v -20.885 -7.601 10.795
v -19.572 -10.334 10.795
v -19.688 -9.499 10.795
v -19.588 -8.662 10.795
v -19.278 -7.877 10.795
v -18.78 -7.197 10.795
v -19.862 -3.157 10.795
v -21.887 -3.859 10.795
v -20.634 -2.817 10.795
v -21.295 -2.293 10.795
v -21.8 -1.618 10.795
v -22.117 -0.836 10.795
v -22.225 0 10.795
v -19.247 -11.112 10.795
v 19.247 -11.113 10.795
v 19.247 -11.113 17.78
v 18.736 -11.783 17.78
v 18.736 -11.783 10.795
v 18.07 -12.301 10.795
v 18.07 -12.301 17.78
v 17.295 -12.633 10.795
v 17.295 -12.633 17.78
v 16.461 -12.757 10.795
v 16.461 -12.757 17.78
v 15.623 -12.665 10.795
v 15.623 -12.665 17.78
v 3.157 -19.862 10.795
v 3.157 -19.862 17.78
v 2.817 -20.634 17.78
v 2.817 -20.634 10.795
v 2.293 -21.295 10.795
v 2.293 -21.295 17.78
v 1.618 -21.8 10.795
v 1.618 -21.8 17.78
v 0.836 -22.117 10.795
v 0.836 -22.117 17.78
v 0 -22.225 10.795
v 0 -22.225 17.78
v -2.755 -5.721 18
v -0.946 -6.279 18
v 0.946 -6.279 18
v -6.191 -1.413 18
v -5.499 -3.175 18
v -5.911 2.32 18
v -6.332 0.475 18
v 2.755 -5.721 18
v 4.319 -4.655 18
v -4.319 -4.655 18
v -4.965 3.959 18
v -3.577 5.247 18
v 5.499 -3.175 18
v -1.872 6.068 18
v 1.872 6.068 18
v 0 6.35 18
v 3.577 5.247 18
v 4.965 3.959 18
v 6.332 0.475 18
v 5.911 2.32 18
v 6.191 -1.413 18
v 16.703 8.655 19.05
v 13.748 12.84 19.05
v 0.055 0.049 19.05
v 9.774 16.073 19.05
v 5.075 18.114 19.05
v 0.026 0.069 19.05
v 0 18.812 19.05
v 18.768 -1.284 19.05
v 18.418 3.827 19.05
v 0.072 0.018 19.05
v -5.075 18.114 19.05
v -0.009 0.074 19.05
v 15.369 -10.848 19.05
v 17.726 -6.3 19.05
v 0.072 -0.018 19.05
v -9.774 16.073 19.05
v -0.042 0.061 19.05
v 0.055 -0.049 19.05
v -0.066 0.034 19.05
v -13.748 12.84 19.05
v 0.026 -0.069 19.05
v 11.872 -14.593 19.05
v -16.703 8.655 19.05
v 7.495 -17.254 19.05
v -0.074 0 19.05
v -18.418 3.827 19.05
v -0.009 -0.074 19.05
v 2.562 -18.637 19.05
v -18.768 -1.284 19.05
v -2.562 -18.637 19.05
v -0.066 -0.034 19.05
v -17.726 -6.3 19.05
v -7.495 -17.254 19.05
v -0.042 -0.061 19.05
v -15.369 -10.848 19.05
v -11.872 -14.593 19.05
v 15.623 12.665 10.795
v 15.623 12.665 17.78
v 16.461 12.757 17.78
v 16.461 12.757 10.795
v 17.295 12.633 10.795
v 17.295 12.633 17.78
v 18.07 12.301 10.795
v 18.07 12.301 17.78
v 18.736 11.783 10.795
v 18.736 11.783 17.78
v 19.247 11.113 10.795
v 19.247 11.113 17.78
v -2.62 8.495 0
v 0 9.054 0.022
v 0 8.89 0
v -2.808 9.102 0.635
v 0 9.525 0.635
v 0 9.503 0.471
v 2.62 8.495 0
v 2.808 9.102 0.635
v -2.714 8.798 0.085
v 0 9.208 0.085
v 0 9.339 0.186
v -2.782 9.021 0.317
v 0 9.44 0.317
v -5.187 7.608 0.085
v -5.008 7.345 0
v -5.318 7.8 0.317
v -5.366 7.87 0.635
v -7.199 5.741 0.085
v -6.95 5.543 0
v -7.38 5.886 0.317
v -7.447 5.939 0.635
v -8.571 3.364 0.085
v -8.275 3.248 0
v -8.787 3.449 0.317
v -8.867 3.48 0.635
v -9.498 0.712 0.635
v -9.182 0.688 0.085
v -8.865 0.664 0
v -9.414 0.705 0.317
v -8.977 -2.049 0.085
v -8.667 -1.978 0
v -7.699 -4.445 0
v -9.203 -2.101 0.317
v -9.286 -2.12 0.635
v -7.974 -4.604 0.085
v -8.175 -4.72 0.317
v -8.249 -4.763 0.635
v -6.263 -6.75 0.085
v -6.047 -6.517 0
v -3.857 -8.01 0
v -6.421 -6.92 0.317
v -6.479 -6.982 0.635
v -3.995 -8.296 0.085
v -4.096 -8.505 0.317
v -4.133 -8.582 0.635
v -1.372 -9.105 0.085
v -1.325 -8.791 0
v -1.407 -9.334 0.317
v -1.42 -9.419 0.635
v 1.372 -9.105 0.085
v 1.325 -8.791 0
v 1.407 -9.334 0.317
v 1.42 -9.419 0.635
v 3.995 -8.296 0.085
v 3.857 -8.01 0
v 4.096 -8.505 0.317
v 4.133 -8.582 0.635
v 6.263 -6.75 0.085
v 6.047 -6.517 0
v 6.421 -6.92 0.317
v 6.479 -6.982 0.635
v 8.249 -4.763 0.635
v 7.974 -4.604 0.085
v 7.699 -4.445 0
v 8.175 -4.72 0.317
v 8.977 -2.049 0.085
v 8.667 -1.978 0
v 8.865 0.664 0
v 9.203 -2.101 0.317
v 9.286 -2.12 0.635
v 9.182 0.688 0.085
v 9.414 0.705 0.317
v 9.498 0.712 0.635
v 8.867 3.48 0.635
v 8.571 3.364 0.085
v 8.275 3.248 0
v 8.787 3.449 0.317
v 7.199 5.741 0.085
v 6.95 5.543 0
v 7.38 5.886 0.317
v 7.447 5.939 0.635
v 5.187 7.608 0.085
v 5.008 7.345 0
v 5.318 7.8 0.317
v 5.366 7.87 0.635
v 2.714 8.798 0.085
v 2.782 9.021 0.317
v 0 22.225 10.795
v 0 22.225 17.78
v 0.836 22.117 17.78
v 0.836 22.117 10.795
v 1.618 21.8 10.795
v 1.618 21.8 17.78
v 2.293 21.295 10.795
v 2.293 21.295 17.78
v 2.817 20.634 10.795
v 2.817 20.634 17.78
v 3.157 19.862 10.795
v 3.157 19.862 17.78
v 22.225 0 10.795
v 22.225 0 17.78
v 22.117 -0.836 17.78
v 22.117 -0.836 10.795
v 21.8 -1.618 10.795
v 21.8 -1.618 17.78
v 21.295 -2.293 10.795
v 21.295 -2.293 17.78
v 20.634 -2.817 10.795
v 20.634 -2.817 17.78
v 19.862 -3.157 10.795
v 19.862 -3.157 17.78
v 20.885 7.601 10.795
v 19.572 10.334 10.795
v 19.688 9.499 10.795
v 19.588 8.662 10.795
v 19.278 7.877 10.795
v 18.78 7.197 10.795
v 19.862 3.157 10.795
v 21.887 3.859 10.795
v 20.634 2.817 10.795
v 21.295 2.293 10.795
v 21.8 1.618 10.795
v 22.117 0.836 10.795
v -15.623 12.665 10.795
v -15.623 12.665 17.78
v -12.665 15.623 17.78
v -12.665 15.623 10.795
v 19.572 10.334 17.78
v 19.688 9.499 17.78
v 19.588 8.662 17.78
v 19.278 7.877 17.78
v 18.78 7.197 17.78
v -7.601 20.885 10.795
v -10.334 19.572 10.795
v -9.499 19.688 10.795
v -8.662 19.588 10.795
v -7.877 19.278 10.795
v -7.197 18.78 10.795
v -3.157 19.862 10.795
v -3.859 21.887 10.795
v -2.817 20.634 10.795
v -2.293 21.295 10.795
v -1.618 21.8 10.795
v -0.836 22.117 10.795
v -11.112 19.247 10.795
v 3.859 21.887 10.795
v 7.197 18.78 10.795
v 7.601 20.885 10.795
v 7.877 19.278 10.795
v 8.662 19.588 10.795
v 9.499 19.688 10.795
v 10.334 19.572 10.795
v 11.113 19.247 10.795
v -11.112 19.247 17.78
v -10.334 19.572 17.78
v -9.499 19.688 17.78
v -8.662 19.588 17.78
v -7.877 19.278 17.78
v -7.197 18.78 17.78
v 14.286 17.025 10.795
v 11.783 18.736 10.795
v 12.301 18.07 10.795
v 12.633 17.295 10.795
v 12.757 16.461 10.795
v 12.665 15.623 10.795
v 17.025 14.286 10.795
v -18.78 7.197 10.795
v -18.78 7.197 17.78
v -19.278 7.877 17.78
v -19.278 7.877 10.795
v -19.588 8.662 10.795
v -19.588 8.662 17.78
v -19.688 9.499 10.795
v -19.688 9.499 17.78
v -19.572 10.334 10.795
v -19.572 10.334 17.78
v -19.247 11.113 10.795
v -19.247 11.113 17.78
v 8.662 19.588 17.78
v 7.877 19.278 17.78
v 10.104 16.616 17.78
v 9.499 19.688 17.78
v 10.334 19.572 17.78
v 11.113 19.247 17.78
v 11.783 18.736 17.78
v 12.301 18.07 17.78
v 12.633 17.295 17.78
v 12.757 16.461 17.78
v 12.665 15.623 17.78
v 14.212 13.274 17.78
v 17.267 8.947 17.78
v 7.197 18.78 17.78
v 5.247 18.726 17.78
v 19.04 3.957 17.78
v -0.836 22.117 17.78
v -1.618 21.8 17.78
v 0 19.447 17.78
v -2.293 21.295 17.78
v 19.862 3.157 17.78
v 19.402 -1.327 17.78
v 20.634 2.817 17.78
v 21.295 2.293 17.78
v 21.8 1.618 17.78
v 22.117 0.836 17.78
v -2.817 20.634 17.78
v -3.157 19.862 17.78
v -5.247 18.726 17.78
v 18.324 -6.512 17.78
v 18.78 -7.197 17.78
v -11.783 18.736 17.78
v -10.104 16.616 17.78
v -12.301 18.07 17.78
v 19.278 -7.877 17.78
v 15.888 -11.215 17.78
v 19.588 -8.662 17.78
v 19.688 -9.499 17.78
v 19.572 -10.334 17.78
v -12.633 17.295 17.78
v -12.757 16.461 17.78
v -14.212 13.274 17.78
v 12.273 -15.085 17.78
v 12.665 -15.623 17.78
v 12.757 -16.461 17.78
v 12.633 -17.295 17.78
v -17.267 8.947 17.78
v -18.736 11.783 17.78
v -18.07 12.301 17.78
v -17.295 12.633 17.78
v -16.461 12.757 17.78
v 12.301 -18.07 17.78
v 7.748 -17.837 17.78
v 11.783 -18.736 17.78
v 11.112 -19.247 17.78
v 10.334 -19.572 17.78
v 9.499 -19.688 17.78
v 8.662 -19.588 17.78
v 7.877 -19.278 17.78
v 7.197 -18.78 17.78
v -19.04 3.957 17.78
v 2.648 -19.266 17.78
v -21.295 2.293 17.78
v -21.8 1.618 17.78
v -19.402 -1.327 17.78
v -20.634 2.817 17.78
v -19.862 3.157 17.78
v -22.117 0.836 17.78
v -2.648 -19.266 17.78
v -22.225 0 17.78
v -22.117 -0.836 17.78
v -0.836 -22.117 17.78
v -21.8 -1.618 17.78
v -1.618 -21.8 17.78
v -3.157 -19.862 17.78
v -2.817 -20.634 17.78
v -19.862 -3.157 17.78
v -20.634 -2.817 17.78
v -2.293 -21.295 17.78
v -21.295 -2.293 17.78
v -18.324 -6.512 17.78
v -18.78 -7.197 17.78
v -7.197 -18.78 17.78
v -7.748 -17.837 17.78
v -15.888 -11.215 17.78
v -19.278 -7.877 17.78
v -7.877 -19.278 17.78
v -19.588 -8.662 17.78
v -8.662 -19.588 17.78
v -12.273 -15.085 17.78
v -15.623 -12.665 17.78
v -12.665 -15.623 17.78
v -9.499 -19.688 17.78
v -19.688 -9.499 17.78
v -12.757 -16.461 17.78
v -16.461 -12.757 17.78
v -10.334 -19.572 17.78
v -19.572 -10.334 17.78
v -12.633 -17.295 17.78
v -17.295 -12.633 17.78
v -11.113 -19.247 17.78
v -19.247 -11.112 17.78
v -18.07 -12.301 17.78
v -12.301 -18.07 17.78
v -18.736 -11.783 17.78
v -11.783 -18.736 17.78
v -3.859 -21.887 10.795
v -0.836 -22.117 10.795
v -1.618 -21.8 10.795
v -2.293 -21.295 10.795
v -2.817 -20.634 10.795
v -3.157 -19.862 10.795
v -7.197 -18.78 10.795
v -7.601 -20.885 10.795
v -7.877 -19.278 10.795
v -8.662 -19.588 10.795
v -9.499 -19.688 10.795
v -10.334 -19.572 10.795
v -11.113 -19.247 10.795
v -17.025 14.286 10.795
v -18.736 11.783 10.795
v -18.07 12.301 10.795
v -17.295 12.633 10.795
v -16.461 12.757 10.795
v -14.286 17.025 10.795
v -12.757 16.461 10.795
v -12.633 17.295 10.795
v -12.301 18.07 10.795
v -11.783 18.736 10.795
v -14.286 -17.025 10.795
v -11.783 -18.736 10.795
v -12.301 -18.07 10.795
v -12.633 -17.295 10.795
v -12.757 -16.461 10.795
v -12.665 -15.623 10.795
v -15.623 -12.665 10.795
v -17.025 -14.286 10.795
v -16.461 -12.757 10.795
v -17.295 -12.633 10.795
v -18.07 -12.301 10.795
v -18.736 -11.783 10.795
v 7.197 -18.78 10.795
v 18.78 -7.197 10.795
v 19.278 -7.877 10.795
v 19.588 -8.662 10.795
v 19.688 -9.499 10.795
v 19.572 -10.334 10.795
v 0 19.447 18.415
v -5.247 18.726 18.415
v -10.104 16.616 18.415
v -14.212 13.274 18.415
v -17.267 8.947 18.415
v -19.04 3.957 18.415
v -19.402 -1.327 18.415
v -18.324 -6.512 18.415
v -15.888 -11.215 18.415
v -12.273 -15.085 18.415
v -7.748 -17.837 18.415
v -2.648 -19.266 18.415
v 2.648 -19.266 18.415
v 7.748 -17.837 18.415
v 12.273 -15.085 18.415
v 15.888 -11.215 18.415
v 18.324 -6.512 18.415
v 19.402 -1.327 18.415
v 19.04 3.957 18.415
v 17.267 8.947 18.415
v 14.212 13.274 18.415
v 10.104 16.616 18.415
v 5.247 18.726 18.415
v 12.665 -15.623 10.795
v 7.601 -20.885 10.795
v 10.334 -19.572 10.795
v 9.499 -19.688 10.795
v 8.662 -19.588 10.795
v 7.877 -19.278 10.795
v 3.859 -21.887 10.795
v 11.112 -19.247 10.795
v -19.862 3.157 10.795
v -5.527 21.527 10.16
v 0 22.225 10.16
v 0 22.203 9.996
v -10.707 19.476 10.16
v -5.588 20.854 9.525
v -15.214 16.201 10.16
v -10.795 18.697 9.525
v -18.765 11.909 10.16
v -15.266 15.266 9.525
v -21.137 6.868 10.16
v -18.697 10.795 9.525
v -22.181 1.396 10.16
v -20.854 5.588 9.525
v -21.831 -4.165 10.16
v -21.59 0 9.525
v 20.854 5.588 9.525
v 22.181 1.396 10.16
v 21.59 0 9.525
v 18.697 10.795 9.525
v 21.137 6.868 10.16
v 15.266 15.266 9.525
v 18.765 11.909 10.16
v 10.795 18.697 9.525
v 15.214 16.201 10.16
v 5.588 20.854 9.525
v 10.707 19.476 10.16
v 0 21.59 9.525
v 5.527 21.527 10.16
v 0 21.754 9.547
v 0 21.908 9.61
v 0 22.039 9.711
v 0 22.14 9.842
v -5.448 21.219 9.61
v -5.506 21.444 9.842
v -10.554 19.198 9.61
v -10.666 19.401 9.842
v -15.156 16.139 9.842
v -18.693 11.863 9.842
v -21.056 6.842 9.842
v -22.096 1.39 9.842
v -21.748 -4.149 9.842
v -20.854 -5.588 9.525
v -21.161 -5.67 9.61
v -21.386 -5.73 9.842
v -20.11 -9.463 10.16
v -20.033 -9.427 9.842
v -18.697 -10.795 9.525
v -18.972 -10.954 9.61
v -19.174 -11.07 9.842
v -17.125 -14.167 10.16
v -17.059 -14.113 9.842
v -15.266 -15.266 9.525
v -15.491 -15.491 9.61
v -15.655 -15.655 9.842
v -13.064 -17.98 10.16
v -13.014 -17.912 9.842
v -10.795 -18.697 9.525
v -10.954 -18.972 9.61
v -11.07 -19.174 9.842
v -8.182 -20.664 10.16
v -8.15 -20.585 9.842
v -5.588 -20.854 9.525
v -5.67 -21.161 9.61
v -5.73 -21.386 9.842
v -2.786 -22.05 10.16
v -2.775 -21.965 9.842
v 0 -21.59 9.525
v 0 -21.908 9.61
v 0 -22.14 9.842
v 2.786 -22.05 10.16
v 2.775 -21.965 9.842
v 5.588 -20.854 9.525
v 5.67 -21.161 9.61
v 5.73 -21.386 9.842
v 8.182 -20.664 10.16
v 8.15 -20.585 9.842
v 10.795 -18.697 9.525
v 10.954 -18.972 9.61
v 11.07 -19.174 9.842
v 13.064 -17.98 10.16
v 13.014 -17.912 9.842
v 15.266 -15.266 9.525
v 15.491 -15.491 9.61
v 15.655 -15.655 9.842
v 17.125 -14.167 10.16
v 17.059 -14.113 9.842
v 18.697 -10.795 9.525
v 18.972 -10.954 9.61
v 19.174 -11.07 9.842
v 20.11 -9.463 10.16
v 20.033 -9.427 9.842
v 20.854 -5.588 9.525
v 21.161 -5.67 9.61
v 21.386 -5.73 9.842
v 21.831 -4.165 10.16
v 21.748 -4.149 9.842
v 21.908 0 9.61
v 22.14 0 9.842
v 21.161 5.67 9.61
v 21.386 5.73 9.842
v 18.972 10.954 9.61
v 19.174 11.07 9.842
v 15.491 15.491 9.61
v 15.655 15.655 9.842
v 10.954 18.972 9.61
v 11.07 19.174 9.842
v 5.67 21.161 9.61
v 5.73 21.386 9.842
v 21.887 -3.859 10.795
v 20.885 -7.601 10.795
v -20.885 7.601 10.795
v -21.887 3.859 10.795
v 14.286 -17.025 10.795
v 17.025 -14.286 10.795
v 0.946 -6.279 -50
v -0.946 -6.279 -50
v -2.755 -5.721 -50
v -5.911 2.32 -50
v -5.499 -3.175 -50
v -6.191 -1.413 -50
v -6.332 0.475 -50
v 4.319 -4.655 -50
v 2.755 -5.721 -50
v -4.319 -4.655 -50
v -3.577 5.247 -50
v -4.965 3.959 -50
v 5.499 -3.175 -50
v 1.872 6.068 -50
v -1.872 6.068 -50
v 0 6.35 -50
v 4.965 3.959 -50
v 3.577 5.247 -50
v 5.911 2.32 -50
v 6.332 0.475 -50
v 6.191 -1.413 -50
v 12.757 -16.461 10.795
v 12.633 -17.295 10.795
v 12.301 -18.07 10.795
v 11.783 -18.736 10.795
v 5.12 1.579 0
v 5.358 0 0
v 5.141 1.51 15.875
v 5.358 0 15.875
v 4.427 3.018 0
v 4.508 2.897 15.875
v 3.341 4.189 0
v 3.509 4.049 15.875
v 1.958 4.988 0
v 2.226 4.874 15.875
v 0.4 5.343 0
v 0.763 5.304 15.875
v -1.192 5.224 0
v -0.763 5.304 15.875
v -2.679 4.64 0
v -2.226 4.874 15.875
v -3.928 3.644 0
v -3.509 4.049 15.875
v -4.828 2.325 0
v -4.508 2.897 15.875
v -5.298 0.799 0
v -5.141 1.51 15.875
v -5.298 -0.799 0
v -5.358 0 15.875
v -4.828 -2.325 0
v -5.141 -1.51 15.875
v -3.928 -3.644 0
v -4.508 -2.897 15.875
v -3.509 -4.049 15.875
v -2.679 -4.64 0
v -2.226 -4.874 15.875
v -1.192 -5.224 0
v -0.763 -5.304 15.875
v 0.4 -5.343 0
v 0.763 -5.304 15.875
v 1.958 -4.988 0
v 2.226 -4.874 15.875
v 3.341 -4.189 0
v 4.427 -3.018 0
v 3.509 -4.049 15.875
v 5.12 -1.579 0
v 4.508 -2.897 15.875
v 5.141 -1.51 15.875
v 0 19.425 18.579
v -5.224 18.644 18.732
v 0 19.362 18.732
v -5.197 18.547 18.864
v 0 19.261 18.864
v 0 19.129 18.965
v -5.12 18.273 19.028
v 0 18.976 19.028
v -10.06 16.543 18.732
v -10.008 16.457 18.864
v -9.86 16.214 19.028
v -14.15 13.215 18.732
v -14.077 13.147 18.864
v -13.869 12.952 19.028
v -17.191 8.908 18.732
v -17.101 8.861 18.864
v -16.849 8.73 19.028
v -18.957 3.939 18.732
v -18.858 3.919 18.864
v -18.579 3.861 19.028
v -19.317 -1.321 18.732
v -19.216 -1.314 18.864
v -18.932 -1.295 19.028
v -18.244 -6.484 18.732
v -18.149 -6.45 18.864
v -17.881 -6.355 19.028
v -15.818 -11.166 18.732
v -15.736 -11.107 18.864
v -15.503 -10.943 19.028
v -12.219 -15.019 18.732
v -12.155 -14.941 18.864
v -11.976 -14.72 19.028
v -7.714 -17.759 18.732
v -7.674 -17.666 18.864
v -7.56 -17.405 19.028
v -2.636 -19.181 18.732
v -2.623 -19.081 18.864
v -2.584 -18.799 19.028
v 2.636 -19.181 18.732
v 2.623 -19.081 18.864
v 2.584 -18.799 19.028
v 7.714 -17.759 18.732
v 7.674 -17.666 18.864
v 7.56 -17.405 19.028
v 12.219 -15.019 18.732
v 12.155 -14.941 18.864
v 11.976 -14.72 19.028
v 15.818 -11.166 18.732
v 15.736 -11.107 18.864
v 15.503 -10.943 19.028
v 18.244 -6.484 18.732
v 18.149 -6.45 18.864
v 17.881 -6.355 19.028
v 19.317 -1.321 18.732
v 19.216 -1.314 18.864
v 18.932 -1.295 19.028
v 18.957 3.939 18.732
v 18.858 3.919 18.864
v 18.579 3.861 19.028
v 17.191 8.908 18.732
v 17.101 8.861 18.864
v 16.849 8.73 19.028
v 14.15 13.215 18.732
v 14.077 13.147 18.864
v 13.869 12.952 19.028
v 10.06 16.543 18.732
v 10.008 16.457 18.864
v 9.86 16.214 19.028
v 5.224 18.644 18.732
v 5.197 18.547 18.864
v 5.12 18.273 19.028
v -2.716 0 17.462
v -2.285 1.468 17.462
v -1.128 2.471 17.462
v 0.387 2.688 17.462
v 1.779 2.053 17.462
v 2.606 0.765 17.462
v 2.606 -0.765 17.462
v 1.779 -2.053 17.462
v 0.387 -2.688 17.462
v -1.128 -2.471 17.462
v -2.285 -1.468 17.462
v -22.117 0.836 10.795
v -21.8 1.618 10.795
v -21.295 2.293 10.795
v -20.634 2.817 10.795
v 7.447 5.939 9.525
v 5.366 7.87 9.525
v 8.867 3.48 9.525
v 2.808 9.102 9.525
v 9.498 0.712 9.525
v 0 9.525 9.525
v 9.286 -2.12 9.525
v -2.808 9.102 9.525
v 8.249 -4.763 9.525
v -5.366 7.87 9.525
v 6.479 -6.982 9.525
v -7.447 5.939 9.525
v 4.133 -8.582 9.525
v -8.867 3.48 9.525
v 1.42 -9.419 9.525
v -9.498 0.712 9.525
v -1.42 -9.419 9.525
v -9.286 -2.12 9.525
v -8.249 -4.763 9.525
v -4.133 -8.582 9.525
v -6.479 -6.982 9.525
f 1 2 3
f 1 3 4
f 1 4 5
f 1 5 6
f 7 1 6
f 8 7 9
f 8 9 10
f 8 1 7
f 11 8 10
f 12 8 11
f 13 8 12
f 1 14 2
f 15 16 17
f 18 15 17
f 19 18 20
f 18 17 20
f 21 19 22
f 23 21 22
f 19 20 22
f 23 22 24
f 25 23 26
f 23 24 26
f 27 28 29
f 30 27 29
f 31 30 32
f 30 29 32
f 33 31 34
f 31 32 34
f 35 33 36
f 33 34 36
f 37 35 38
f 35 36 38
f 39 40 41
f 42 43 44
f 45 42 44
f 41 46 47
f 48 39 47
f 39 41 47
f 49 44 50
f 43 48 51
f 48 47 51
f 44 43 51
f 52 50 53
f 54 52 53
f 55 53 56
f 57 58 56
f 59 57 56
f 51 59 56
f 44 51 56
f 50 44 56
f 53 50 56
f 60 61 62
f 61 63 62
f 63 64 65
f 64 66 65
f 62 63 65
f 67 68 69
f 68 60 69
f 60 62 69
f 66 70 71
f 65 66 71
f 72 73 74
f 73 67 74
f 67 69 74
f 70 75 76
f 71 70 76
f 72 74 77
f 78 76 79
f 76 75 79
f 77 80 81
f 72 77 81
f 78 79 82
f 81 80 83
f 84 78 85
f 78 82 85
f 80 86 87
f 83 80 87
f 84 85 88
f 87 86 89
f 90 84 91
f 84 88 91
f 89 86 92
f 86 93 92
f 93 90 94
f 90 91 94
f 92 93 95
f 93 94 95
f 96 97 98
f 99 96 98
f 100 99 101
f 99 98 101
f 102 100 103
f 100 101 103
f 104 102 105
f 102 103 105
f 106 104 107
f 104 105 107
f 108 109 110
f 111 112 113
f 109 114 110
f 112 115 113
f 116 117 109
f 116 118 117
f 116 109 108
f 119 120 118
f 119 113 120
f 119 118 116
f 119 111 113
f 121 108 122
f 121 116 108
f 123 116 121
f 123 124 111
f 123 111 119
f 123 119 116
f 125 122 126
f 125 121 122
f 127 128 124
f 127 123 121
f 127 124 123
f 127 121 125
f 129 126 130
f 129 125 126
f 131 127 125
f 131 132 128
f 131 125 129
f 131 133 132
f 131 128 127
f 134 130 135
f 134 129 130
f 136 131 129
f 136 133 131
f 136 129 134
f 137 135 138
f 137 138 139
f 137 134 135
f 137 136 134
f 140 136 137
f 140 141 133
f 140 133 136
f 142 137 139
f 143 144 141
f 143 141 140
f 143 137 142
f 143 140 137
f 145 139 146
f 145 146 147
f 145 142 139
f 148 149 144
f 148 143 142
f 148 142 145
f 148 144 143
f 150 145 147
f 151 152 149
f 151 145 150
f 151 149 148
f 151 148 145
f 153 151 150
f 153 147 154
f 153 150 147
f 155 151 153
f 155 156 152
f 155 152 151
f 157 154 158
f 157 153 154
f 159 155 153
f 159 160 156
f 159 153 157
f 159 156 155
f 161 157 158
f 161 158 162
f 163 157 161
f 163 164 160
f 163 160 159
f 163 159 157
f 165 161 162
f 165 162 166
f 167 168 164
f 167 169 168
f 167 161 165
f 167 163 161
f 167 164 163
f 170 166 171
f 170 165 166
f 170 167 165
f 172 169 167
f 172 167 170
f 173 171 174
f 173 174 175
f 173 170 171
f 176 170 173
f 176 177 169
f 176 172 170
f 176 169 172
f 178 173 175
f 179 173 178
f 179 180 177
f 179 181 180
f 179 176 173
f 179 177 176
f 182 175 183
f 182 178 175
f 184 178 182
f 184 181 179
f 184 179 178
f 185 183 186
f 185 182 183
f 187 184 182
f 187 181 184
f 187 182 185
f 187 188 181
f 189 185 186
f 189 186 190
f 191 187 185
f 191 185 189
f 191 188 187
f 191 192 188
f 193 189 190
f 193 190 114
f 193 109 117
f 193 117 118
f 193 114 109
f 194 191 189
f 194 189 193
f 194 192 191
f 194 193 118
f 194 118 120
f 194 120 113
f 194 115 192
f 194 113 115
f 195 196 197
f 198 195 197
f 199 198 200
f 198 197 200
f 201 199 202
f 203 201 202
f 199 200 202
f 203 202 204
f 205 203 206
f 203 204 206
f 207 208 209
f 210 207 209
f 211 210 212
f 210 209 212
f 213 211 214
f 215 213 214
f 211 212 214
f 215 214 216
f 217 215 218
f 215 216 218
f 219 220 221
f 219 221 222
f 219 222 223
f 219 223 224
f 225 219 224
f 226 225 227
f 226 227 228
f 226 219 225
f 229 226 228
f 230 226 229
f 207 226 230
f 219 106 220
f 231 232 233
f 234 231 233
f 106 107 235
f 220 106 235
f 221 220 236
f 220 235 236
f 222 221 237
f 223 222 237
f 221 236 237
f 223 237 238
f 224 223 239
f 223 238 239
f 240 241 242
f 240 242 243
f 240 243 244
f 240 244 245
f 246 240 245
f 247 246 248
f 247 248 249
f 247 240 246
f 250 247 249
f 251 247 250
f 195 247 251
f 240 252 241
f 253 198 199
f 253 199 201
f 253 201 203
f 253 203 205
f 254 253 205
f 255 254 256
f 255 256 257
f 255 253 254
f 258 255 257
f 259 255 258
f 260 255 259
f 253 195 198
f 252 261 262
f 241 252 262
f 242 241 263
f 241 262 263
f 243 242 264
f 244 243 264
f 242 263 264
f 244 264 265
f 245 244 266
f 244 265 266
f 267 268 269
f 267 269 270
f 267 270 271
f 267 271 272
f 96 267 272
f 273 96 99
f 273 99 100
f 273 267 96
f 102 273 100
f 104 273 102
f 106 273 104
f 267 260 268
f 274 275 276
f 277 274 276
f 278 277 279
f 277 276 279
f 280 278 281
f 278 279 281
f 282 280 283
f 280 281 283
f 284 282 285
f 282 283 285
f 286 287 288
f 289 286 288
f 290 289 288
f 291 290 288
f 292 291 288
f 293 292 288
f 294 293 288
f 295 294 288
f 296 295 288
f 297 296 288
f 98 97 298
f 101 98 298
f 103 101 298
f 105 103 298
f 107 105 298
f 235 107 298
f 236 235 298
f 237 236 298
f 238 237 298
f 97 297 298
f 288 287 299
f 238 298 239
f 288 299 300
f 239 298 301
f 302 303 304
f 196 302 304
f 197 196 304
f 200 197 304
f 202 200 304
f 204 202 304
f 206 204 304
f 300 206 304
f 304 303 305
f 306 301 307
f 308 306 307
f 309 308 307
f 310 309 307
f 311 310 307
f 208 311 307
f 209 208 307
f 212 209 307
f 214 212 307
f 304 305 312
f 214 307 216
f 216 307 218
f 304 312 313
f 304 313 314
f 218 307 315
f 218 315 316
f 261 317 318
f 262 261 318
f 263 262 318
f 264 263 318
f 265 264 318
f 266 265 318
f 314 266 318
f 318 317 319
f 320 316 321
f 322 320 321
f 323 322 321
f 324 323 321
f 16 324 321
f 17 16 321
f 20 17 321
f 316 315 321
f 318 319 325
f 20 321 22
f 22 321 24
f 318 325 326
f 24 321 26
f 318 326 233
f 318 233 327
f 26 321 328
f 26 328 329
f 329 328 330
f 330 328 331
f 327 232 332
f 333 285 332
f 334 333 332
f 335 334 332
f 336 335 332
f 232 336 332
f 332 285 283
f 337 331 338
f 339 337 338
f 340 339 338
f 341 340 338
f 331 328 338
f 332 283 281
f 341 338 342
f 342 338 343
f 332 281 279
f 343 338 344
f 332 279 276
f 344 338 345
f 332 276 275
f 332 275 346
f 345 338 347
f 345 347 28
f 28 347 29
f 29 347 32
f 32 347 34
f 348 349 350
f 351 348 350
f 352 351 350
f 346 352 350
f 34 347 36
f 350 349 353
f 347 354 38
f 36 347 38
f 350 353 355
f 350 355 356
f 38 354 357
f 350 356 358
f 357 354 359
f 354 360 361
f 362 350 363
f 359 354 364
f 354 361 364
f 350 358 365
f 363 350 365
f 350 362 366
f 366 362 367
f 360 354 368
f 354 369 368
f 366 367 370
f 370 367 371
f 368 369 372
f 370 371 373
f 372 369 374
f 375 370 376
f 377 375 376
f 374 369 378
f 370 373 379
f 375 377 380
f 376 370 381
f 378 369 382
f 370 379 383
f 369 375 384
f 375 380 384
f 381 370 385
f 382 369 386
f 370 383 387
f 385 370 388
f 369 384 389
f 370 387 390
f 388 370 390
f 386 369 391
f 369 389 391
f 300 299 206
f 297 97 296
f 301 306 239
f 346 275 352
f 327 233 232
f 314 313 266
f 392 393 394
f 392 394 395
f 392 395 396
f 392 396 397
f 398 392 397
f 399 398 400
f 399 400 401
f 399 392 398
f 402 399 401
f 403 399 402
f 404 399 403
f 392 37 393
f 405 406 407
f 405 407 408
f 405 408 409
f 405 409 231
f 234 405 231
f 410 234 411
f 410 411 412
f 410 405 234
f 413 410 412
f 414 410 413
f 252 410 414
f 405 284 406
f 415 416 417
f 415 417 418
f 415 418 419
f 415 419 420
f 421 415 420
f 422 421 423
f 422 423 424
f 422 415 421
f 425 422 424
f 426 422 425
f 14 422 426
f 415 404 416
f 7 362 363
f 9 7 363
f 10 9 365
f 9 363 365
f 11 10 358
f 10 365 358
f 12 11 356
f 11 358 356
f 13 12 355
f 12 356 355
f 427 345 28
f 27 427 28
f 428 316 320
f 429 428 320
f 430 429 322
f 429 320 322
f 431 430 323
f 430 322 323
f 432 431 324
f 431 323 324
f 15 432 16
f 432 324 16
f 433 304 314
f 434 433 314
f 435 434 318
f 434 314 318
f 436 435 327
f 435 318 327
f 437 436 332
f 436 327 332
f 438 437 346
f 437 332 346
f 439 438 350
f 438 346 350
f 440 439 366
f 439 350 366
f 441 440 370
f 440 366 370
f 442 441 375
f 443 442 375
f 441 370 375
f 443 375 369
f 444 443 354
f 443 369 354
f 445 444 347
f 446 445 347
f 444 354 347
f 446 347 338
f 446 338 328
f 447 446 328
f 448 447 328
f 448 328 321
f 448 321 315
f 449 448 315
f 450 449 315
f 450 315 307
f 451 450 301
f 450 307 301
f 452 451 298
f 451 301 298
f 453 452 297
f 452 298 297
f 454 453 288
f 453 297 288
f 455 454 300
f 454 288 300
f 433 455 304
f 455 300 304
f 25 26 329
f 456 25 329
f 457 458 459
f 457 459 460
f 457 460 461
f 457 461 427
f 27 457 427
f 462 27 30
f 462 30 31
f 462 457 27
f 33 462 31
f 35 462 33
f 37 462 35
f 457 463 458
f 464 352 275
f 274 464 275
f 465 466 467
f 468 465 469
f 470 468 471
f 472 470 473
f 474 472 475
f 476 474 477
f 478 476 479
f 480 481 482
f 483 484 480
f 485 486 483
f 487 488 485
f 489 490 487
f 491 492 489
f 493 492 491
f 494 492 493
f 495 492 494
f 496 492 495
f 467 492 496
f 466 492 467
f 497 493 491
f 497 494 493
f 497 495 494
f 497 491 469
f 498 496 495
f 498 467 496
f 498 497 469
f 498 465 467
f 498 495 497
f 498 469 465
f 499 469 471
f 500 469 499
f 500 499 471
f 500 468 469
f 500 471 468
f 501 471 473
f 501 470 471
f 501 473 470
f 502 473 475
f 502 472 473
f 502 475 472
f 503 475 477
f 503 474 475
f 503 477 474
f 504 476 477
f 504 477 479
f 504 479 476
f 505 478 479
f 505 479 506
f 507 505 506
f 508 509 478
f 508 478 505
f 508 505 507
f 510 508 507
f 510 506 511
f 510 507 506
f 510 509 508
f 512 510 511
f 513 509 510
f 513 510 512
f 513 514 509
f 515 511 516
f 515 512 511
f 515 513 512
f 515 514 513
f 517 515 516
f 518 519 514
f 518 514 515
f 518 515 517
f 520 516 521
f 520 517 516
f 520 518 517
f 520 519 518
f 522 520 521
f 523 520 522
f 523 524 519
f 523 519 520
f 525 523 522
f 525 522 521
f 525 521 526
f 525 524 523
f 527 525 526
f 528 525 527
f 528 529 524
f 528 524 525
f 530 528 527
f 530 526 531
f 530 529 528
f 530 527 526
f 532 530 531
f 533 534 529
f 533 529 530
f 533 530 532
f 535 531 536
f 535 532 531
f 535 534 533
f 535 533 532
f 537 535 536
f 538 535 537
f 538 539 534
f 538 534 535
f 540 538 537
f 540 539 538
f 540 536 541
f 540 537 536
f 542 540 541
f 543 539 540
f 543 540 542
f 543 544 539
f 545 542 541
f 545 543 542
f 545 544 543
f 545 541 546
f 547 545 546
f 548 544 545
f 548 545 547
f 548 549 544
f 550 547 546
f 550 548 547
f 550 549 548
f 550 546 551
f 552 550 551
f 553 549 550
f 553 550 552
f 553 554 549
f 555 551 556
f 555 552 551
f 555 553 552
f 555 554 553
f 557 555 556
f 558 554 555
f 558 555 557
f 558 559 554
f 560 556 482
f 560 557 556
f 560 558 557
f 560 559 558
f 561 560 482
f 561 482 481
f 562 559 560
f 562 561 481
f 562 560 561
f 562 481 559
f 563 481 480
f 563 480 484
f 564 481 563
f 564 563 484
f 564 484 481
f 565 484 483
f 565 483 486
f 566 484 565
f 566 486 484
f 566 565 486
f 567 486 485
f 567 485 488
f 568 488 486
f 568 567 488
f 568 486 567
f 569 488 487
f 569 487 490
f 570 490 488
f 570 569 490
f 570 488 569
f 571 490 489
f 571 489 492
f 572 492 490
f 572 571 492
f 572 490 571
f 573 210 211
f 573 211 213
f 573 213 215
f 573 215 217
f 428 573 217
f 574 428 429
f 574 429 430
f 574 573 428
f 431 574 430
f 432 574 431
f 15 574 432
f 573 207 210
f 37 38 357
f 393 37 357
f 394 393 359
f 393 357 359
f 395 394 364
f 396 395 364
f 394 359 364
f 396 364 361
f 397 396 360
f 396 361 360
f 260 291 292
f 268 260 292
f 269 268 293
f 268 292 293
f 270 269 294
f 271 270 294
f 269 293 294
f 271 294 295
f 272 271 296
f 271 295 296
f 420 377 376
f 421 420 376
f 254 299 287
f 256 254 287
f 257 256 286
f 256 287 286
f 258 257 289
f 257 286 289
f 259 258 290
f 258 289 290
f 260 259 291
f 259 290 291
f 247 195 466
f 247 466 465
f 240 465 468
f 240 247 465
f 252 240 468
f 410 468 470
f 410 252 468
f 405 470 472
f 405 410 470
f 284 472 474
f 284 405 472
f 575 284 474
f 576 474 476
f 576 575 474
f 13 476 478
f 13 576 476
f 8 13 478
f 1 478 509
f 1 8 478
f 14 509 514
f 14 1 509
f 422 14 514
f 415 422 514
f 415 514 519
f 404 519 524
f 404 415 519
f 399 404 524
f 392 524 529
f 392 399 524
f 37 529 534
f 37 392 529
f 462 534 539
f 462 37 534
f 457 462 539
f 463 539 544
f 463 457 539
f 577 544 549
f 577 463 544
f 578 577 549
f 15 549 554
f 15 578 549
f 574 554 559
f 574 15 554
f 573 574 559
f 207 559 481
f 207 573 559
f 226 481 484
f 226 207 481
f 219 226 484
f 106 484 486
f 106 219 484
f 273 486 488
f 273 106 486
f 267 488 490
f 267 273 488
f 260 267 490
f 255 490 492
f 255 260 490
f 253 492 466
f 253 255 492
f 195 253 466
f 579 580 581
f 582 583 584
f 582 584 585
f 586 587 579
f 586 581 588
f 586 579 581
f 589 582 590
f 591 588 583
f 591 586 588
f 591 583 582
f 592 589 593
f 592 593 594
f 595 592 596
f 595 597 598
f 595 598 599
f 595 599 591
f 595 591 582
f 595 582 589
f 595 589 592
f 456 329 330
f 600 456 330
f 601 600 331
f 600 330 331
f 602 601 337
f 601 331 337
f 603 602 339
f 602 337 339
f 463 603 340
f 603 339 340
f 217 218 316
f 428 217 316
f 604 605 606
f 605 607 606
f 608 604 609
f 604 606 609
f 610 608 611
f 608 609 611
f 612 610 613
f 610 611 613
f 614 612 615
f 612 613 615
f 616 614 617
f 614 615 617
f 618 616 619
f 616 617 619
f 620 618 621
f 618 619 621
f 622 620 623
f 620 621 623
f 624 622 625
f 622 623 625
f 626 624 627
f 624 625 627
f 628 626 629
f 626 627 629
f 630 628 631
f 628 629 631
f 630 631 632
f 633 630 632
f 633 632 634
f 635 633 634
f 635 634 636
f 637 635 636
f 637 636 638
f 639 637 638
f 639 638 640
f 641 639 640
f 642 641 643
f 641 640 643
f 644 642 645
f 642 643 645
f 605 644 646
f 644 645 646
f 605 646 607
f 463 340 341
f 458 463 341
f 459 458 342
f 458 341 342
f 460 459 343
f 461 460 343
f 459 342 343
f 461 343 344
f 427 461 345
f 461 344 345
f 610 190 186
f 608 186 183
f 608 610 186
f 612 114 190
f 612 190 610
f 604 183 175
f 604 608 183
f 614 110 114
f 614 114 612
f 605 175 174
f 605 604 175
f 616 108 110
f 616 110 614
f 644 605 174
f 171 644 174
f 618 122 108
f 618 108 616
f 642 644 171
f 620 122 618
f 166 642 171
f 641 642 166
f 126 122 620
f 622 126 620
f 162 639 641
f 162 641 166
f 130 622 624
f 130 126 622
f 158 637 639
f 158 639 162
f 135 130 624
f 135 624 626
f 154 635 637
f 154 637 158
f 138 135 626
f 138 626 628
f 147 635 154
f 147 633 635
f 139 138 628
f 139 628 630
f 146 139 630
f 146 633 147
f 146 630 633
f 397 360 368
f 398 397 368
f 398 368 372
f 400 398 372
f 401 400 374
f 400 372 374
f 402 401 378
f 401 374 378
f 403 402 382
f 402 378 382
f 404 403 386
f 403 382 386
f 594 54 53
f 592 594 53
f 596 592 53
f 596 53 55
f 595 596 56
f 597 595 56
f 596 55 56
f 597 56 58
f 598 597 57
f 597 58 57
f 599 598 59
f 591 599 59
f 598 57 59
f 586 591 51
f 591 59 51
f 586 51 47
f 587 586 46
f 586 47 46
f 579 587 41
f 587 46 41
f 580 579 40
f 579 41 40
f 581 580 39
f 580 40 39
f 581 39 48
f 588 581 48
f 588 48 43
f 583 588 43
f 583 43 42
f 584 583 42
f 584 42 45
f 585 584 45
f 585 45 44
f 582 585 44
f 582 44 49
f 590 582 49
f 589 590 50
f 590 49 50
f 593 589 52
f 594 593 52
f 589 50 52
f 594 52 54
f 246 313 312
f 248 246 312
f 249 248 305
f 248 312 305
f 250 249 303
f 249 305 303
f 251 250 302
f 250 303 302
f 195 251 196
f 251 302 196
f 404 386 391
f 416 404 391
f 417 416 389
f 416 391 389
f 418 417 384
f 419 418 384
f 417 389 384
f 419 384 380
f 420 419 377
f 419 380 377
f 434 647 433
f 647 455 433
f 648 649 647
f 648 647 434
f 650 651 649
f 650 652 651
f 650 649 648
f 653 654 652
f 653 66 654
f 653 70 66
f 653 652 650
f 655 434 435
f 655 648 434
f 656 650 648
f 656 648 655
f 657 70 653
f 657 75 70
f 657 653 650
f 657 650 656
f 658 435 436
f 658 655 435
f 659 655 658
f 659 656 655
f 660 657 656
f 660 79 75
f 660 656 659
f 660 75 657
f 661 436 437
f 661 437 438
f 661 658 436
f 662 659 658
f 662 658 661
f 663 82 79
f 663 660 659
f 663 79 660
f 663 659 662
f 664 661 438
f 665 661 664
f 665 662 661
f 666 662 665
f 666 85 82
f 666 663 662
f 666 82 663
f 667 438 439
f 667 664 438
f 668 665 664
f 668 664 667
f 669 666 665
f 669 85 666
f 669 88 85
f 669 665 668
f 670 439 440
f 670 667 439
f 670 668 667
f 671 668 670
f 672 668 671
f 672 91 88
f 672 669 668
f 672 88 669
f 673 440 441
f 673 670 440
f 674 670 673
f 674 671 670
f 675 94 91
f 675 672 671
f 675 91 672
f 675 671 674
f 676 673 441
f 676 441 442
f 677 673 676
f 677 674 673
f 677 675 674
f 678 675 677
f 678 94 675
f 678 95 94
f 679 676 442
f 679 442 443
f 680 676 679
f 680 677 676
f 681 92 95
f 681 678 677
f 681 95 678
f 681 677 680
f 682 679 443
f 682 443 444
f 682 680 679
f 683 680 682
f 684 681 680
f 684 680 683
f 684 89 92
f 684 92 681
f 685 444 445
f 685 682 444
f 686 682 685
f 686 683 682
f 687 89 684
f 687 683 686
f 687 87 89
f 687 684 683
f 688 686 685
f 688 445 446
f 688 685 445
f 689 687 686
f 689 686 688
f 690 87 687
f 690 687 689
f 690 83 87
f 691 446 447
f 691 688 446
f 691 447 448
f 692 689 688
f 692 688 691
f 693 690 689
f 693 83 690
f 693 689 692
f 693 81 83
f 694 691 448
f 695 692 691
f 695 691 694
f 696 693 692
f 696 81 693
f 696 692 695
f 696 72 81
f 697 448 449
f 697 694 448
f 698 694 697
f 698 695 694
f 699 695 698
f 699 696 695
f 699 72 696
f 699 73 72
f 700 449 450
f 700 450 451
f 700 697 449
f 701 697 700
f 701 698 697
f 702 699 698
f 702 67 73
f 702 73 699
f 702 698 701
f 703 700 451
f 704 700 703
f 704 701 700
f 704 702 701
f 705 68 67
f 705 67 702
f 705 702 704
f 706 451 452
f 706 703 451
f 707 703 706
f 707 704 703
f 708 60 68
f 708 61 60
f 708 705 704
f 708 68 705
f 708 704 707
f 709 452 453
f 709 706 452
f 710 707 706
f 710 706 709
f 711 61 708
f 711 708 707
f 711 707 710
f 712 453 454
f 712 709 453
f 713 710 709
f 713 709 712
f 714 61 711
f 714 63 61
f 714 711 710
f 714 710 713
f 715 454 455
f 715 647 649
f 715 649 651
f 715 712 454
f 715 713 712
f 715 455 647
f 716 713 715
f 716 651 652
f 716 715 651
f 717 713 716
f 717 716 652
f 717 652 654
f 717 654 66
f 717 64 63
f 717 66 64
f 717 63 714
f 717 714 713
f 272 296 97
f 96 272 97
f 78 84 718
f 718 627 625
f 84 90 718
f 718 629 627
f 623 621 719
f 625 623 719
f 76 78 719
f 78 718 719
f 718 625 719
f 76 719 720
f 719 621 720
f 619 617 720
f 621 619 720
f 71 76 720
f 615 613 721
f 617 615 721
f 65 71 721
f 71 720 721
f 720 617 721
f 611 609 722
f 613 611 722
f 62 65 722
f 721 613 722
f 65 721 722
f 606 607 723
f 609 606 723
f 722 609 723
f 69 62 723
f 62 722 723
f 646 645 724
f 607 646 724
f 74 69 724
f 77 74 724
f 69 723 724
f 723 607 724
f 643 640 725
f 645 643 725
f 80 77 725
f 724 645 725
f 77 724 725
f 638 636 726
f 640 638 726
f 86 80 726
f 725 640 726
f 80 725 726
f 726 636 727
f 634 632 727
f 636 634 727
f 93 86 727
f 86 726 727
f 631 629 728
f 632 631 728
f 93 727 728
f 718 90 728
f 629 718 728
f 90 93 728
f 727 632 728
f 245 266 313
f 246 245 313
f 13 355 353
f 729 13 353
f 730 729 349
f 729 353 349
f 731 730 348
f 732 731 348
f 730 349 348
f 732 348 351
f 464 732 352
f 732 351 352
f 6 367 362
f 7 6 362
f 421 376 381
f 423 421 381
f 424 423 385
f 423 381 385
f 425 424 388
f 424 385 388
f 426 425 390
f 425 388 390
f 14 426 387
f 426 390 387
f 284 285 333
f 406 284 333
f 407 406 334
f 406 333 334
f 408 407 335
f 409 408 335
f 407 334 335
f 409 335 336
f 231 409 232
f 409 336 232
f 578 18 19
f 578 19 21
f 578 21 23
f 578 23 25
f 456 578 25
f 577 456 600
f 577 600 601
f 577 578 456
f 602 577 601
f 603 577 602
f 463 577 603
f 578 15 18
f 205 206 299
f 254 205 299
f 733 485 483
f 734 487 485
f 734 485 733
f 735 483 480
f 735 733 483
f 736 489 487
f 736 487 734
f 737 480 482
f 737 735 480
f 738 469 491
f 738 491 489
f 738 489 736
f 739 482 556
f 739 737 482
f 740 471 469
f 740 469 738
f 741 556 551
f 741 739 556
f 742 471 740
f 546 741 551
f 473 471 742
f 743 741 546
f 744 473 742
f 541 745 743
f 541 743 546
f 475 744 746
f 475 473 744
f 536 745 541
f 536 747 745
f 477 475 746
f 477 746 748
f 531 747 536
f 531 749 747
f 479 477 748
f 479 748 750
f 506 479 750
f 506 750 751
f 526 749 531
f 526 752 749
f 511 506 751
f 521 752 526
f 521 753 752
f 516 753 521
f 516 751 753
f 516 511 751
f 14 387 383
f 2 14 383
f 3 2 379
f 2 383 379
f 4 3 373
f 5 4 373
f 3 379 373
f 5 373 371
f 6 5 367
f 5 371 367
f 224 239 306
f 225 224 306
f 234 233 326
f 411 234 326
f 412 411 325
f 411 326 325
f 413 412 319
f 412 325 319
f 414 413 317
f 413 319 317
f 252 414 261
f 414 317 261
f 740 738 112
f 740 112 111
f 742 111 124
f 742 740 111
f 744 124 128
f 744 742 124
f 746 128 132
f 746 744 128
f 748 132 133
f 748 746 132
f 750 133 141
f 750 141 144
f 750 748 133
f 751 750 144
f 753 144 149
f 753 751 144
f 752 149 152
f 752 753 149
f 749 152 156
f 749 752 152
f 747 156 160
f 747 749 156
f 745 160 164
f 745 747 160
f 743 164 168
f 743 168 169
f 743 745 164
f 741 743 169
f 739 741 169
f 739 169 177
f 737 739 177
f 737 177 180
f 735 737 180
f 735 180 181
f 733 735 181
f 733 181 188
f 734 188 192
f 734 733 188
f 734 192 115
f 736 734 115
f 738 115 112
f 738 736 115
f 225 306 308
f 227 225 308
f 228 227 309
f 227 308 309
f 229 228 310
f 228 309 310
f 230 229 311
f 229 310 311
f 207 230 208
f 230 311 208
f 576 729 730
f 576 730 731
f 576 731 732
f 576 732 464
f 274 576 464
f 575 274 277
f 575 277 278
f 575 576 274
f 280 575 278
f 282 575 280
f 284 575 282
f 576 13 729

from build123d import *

# Parameters (mm, degrees)
CUT_EXTRUDE1_START          = -6.985
CUT_EXTRUDE1_DEPTH          = 6.985
CIRPATTERN1_COUNT           = 12
SKETCH6_W                   = 1.27
SKETCH6_H                   = 22.225
SKETCH7_W                   = 1.27
SKETCH7_H                   = 19.446875
FILLET1_R                   = 0.635
F_1_2_13_TAPPED_HOLE1_D     = 10.71626
F_1_2_13_TAPPED_HOLE1_DEPTH = 15.875
F_1_2_13_TAPPED_HOLE1_TIP   = 3.219489309
BOSS_EXTRUDE1_DEPTH         = 50
BOSS_EXTRUDE1_DEPTH_BACK    = 18
SKETCH11_R                  = 6.35


with BuildPart() as part:
    # Sketch4 → Revolve2 (revolve)
    with BuildSketch(Plane(origin=(0, 0, 0), x_dir=(0, 0, -1), z_dir=(1, 0, 0))):
        Polygon((0, 0), (0, 9.525), (-9.525, 9.525), (-9.525, 22.225), (-16.1925, 22.225), (-19.05, 22.225), (-19.05, 0), align=None)
    revolve(axis=Axis((0, 0, 0), (0, 0, 1)))

    # Sketch5 → Cut-Extrude1 (cut)
    with BuildSketch(Plane(origin=(0, 0, 10.795), x_dir=(-1, 0, 0), z_dir=(0, 0, -1)).offset(CUT_EXTRUDE1_START)):
        with BuildLine():
            Line((-3.156573404, 19.862310504), (-7.197482495, 18.779552177))
            ThreePointArc((-7.197482495, 18.779552177), (-9.077139161, 19.664940458), (-11.1125, 19.247414599))
            Line((-11.1125, 19.247414599), (-21.036811986, 36.436827189))
            Line((-21.036811986, 36.436827189), (0, 42.073623972))
            Line((0, 42.073623972), (0, 22.225))
            ThreePointArc((0, 22.225), (-1.971437122, 21.568907581), (-3.156573404, 19.862310504))
        make_face()
    cut_extrude1 = extrude(amount=CUT_EXTRUDE1_DEPTH, mode=Mode.SUBTRACT)

    # CirPattern1: Cut-Extrude1 ×12 about axis
    cirpattern1_axis = Axis((0, 0, 0), (0, 0, 1))
    for i in range(1, CIRPATTERN1_COUNT):
        add(cut_extrude1.rotate(cirpattern1_axis, i * 360 / CIRPATTERN1_COUNT), mode=Mode.SUBTRACT)

    # Sketch6 → Cut-Revolve3 (revolve, cut)
    with BuildSketch(Plane(origin=(0, 0, 0), x_dir=(0, 0, -1), z_dir=(1, 0, 0))):
        with Locations((-18.415, 11.1125)):
            Rectangle(SKETCH6_W, SKETCH6_H)
    revolve(axis=Axis((0, 0, 0), (0, 0, 1)), mode=Mode.SUBTRACT)

    # Sketch7 → Revolve3 (revolve)
    with BuildSketch(Plane(origin=(0, 0, 0), x_dir=(0, 0, -1), z_dir=(1, 0, 0))):
        with Locations((-18.415, 9.7234375)):
            Rectangle(SKETCH7_W, SKETCH7_H)
    revolve(axis=Axis((0, 0, 0), (0, 0, 1)))

    # Fillet1
    fillet1_edges = [part.edges().sort_by_distance(p)[0] for p in [
        (0, -19.446875, 19.05),
        (0, -22.225, 9.525),
        (0, -9.525, 0),
    ]]
    fillet(fillet1_edges, radius=FILLET1_R)

    # 1/2-13 Tapped Hole1
    with Locations(Plane(origin=(0, 0, 0), x_dir=(-1, 0, 0), z_dir=(0, 0, -1))):
        with Locations((0, 0)):
            Hole(F_1_2_13_TAPPED_HOLE1_D / 2, depth=F_1_2_13_TAPPED_HOLE1_DEPTH)
            with Locations((0, 0, -(F_1_2_13_TAPPED_HOLE1_DEPTH + F_1_2_13_TAPPED_HOLE1_TIP / 2))):  # 118° drill point
                Cone(0, F_1_2_13_TAPPED_HOLE1_D / 2, F_1_2_13_TAPPED_HOLE1_TIP, mode=Mode.SUBTRACT)


with BuildPart() as body_2:
    # Sketch11 → Boss-Extrude1 (new, two sides: drawn at the far end of the back side and taken through both)
    with BuildSketch(Plane(origin=(0, 0, 0), x_dir=(-1, 0, 0), z_dir=(0, 0, -1)).offset(-BOSS_EXTRUDE1_DEPTH_BACK)):
        with Locations(Location((0, 0, 0), (0, 0, 90))):
            Circle(SKETCH11_R)
    extrude(amount=BOSS_EXTRUDE1_DEPTH + BOSS_EXTRUDE1_DEPTH_BACK)


solid = Compound([part.part, body_2.part])
